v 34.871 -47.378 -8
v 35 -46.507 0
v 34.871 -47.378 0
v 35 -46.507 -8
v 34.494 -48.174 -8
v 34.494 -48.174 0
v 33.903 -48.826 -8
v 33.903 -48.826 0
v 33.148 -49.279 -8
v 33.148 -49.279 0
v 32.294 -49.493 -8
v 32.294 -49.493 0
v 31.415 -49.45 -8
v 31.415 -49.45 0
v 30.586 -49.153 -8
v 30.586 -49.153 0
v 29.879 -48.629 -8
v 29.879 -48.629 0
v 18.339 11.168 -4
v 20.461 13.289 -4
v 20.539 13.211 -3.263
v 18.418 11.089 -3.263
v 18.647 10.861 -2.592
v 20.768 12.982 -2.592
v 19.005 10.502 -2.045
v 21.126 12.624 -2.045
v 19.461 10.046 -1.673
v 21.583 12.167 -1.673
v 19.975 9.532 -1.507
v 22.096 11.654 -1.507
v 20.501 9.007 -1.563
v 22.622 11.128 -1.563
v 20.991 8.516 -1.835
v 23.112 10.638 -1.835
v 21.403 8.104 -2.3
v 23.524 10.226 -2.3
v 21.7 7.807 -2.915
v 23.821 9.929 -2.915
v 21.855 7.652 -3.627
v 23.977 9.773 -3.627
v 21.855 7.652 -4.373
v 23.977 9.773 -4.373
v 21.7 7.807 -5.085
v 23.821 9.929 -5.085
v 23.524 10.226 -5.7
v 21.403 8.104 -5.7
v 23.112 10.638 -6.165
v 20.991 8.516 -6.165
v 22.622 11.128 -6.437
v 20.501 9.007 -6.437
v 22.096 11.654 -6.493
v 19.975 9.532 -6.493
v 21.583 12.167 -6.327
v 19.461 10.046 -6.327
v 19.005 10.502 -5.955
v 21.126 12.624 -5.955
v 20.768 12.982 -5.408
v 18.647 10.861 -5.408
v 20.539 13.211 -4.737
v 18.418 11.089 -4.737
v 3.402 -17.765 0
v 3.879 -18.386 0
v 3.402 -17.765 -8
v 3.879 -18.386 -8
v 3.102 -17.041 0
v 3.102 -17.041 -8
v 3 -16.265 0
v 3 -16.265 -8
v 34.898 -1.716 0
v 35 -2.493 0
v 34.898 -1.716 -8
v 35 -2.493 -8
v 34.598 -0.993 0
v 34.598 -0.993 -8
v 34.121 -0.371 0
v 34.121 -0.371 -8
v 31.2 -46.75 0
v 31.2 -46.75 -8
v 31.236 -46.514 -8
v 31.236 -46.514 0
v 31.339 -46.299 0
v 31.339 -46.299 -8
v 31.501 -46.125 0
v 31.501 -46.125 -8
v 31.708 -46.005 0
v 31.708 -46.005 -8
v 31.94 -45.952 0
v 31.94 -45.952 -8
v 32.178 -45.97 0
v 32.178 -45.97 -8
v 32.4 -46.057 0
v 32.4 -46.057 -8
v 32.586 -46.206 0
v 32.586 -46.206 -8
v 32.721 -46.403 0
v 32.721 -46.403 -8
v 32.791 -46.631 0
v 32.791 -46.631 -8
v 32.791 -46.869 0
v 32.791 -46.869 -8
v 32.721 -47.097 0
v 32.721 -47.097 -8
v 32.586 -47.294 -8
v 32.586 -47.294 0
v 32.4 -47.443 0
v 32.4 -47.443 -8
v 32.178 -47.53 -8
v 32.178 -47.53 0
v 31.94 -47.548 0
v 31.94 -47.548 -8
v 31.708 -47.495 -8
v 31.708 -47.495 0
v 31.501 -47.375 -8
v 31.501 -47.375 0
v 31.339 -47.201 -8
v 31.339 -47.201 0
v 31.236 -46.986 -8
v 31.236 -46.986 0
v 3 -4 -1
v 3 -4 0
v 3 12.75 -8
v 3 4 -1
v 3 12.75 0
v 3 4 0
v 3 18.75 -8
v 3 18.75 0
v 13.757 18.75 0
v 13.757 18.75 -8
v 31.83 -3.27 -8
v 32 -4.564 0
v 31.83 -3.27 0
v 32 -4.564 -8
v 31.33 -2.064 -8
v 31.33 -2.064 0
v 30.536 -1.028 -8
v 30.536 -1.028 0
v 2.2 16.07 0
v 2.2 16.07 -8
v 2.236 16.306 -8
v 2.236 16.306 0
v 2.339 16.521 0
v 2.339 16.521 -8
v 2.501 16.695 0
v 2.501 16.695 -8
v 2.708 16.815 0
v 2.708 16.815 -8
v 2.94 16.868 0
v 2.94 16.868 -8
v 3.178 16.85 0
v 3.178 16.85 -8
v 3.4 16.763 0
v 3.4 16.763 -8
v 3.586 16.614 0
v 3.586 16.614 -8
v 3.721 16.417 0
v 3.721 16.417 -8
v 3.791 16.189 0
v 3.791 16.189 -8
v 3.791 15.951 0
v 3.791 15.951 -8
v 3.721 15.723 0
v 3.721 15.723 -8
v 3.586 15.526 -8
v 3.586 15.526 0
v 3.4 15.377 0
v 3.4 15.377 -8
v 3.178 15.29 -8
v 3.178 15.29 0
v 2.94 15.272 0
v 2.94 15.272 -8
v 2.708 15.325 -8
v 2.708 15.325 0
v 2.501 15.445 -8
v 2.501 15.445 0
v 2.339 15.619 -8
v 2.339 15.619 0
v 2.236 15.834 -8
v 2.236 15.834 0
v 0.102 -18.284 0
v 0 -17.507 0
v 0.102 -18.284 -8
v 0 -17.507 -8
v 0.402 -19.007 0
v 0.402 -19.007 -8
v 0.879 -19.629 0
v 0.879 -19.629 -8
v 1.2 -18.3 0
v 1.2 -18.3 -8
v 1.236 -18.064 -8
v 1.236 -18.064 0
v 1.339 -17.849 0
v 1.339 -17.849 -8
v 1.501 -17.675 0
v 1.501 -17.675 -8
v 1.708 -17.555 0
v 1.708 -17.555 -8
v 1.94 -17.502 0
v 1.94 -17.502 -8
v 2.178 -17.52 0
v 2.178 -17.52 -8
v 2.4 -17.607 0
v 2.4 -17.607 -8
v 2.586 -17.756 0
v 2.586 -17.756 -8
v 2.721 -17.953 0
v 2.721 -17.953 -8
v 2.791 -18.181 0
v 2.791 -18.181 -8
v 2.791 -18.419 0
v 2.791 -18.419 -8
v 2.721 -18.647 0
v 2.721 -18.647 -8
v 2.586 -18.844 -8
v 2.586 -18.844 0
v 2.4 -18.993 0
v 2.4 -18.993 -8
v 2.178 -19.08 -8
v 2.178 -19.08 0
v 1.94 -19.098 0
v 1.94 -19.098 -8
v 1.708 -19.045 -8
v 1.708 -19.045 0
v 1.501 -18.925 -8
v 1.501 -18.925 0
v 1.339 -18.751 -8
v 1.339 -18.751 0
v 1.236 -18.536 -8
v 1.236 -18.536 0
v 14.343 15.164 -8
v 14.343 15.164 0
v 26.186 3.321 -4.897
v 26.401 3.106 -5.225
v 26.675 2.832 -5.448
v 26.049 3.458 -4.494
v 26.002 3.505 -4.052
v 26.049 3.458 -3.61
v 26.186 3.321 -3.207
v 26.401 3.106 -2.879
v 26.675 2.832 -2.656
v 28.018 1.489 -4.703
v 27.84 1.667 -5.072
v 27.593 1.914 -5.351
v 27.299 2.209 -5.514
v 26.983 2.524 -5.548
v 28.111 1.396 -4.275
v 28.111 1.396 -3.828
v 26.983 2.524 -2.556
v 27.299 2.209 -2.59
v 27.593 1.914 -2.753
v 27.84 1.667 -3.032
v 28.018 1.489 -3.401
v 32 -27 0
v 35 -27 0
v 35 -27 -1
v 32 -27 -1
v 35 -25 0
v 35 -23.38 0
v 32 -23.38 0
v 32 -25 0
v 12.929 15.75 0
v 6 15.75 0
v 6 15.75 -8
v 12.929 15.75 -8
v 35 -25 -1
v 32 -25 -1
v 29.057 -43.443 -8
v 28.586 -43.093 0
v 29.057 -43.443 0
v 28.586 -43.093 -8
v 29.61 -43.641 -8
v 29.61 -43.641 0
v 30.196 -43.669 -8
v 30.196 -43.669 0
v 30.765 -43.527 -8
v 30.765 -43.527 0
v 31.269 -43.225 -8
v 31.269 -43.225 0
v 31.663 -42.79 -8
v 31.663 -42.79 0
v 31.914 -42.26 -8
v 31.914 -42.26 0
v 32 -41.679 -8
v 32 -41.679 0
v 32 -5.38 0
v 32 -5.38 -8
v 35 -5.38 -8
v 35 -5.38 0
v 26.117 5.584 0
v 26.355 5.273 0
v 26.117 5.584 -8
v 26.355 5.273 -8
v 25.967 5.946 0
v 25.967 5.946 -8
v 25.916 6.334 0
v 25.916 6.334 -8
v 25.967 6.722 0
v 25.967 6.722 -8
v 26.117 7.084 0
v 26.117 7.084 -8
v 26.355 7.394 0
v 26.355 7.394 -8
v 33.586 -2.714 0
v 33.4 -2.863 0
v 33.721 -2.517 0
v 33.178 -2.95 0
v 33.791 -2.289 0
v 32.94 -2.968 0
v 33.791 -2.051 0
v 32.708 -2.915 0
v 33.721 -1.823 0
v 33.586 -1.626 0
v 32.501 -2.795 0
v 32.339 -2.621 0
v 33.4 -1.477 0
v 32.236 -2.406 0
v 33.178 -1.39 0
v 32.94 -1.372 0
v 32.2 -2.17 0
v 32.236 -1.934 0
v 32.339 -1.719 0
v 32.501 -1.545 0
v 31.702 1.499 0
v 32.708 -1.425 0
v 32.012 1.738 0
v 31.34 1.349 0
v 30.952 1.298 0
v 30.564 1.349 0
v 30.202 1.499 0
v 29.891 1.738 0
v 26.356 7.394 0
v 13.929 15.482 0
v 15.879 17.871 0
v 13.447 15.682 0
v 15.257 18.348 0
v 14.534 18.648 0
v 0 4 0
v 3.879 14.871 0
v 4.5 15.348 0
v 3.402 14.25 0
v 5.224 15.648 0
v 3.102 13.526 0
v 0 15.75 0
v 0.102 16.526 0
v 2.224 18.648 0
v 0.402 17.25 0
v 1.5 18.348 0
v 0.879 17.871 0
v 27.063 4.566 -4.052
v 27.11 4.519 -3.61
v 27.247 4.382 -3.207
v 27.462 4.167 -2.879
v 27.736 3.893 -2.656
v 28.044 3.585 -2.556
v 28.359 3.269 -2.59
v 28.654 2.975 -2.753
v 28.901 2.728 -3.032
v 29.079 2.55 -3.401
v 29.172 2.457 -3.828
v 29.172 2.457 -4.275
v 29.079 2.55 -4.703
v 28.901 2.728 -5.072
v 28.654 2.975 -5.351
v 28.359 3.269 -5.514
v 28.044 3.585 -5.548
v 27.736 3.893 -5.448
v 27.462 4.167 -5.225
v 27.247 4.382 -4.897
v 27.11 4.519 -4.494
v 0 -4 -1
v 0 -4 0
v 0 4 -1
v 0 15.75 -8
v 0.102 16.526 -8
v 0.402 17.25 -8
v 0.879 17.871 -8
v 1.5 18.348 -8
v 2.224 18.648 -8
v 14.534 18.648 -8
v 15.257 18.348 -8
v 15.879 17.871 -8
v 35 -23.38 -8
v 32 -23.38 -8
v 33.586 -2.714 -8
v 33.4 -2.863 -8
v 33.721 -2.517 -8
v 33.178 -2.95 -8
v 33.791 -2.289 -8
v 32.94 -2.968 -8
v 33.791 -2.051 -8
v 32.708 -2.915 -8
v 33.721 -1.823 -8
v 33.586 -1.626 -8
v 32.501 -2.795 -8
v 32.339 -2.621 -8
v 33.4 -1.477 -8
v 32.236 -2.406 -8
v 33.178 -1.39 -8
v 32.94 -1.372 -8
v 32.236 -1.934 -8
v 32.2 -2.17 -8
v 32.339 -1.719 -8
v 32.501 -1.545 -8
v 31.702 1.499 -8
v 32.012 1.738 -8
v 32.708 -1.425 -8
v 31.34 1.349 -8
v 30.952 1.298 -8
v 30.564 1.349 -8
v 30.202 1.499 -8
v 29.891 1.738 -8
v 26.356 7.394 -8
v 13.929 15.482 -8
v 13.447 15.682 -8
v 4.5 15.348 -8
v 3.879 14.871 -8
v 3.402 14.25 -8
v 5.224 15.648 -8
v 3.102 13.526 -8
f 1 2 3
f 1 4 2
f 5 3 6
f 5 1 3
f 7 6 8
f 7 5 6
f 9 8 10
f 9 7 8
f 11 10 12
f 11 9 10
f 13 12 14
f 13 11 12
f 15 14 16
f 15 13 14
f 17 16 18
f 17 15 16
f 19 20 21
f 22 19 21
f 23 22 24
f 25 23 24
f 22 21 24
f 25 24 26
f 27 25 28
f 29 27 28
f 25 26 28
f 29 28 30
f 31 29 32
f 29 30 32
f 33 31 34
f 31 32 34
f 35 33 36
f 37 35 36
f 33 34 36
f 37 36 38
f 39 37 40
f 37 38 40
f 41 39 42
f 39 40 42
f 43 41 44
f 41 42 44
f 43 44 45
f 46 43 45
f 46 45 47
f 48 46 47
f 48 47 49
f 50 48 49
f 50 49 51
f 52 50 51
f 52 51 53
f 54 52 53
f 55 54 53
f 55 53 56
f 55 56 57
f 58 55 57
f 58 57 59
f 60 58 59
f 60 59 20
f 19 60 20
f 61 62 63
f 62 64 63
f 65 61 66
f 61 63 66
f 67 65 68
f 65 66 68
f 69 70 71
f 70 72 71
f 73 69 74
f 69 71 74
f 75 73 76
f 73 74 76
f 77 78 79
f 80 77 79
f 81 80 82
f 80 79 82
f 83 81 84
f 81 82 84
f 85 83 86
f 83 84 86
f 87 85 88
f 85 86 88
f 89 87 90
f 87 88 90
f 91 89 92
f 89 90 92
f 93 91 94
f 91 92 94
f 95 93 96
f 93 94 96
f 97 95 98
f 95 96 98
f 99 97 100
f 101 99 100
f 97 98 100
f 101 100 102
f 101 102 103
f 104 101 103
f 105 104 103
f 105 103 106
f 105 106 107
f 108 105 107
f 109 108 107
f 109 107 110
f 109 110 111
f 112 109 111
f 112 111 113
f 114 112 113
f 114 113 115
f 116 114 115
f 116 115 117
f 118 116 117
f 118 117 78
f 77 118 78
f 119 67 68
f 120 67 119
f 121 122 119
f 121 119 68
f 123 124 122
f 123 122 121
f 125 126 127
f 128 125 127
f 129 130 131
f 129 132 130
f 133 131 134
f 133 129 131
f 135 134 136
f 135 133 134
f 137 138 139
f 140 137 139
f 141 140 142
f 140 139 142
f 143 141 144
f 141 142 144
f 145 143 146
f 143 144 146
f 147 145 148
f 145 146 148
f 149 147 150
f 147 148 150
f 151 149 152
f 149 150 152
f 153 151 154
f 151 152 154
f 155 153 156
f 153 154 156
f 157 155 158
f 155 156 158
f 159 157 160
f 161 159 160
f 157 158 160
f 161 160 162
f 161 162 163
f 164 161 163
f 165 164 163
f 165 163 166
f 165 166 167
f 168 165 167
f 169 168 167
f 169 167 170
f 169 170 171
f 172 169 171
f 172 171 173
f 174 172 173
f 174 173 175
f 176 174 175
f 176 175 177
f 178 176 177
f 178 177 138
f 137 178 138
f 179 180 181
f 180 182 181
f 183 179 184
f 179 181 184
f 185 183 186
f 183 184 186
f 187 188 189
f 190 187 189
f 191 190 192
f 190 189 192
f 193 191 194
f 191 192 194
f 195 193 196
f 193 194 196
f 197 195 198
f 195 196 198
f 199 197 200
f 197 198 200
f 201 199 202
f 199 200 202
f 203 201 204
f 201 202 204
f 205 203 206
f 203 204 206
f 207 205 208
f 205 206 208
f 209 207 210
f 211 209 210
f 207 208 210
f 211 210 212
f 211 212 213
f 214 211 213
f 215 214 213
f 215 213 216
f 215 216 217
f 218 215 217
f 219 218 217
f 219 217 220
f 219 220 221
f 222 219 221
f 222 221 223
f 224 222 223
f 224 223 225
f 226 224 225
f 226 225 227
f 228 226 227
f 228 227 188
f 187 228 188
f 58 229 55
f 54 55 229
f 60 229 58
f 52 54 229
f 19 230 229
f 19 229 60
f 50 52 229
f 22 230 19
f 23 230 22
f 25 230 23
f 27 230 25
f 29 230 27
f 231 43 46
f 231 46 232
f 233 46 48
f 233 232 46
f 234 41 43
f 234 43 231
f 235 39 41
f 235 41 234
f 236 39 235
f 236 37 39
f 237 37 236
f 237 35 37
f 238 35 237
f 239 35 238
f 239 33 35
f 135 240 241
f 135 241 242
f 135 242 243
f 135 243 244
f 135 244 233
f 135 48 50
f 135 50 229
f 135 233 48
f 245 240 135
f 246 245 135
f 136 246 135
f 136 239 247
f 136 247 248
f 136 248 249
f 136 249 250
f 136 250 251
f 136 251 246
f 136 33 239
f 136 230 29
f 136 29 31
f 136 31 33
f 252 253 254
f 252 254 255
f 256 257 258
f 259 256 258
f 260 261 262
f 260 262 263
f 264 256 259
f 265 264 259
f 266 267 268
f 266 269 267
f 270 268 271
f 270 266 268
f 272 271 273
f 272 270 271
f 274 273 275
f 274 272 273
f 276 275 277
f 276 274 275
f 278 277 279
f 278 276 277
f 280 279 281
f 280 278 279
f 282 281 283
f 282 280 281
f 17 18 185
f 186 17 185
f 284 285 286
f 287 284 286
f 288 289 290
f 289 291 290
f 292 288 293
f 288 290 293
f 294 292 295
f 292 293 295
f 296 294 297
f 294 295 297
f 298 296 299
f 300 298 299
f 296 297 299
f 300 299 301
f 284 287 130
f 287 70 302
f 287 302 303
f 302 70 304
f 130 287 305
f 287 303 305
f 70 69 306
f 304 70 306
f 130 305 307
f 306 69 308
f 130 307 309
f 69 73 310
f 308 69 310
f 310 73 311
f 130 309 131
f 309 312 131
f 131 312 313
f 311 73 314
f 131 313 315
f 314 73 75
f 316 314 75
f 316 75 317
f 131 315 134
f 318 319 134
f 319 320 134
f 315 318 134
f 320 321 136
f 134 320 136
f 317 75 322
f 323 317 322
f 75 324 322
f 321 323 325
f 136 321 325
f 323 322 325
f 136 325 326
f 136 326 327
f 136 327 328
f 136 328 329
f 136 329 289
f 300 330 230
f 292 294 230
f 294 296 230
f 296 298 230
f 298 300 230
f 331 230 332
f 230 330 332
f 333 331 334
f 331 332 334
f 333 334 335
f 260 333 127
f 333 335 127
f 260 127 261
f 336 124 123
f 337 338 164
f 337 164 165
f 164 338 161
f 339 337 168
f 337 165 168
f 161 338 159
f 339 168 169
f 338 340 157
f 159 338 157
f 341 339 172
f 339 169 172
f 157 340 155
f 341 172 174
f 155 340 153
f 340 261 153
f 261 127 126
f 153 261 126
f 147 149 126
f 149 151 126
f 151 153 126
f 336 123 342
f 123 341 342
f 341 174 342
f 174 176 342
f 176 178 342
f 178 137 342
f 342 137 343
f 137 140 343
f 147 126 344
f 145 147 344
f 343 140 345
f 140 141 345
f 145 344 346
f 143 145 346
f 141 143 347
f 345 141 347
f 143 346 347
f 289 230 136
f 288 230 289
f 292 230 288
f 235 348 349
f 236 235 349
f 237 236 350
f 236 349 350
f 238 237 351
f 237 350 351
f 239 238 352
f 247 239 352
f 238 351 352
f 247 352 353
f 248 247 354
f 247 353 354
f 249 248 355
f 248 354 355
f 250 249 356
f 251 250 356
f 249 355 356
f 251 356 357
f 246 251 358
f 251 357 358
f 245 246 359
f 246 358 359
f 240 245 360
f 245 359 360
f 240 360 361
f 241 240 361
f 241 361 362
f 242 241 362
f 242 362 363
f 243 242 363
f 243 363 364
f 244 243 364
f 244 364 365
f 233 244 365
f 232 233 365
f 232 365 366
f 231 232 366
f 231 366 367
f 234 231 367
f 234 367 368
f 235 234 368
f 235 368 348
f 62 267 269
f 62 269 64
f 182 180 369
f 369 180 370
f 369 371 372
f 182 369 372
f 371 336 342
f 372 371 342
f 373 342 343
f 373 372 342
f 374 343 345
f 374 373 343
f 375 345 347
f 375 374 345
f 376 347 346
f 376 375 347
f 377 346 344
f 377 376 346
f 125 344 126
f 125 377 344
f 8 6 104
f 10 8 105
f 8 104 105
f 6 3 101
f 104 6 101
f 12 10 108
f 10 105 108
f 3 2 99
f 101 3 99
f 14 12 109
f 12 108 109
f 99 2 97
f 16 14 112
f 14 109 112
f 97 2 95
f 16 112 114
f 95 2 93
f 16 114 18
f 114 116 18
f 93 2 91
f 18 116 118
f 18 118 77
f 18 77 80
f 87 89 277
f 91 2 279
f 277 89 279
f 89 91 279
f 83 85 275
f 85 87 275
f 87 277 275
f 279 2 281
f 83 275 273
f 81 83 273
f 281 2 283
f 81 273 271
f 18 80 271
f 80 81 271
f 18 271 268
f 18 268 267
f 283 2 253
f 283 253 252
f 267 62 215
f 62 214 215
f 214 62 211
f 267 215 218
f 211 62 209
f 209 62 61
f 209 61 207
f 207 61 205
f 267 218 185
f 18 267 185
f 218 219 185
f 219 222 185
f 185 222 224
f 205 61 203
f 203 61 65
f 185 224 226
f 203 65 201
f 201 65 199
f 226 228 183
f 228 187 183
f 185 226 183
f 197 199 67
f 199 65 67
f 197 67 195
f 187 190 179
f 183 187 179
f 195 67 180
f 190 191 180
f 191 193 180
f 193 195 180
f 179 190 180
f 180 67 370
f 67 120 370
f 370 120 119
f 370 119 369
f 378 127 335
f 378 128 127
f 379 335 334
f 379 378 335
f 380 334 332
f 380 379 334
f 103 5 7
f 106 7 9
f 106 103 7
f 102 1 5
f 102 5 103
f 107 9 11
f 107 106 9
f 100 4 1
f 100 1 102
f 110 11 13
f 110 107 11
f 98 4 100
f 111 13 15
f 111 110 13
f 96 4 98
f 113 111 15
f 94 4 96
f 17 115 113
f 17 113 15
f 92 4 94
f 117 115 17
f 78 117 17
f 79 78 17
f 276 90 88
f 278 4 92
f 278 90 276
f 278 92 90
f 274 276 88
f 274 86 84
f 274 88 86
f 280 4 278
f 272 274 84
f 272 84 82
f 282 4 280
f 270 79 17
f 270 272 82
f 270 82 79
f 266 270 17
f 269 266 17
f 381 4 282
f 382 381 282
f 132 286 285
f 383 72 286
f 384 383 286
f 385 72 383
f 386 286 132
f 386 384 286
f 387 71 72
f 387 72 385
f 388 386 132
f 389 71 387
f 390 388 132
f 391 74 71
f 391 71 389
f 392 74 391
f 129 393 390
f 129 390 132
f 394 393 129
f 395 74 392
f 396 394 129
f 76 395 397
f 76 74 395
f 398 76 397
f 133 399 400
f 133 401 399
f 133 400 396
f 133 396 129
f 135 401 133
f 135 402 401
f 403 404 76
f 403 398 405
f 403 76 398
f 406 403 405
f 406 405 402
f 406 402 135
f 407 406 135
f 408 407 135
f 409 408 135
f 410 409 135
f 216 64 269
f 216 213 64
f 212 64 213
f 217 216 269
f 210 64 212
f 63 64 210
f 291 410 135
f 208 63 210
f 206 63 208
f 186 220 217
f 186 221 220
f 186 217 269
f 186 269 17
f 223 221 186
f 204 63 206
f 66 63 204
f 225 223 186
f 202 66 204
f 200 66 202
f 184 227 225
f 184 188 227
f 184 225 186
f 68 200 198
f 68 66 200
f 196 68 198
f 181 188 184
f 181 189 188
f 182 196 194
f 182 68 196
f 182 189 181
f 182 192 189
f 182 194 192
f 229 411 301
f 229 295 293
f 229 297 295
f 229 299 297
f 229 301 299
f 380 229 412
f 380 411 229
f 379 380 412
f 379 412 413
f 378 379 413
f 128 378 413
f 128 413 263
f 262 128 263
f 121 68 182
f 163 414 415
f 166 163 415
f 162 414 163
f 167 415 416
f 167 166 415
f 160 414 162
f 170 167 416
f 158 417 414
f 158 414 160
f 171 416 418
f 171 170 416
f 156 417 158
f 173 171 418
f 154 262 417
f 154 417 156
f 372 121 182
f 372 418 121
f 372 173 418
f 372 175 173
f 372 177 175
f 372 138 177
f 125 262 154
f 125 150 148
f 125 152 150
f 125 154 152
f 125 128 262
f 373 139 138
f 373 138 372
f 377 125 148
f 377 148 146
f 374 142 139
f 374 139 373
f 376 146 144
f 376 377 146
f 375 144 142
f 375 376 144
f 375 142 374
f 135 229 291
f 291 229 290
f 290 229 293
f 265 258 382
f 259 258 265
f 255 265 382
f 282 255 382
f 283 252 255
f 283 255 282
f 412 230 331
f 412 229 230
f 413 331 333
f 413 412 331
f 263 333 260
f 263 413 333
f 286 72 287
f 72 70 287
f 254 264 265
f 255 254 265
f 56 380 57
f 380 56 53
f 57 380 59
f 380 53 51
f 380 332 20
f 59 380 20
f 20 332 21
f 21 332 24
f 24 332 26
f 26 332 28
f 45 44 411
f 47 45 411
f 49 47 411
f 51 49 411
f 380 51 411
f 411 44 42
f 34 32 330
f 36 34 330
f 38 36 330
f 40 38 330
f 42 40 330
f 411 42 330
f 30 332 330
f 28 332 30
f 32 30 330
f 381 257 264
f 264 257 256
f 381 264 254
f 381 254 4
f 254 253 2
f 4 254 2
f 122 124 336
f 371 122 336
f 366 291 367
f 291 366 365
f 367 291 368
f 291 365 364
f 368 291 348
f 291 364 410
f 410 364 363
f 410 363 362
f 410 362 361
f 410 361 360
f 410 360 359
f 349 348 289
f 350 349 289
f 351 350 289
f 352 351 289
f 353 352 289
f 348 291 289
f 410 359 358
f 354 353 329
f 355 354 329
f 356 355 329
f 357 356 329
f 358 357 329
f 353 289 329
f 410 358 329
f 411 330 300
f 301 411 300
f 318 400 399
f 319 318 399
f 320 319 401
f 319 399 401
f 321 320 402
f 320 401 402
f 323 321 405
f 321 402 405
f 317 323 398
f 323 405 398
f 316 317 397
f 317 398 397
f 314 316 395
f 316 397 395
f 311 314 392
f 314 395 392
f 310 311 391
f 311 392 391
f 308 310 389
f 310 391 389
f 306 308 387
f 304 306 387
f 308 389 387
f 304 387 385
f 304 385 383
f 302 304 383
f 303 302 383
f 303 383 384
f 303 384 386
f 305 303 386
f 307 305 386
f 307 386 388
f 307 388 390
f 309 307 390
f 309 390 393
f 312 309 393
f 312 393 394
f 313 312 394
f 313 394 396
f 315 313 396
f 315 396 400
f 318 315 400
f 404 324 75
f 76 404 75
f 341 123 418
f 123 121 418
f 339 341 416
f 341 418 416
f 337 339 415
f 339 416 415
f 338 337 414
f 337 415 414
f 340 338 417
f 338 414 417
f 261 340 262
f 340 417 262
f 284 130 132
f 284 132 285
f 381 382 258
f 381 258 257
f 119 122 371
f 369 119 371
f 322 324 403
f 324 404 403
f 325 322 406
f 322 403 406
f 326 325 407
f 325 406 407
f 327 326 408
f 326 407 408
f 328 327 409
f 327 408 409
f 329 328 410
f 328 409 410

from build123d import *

# Parameters (mm, degrees)
EXTRUDE_1079_DEPTH     = 8
FILLET_4_R             = 3
FILLET_5_R             = 2
SKETCH_13_W            = 3
SKETCH_13_H            = 8
SKETCH_13_H_2          = 2
CUT_EXTRUDE_2700_DEPTH = 1
HOLE_WIZARD_M2_D       = 1.6
FILLET_6_R             = 3
FILLET_7_R             = 5
SKETCH_19_W            = 4
SKETCH_19_H            = 18
CUT_EXTRUDE_4512_DEPTH = 62.155364655
CUT_EXTRUDE_1_REACH    = 71.276
SKETCH_20_R            = 2.5
SKETCH_20_R_2          = 1.5
CUT_EXTRUDE_2_DEPTH    = 62.155364655
FILLET_8_R             = 1.5


with BuildPart() as part:
    # Эскиз8 → Extrude 1079 (new body)
    with BuildSketch(Plane.XY):
        Polygon((0, -18.75), (0, 18.75), (15, 18.75), (35, -1.25), (35, -53.75), align=None)
        Polygon((32, -46.507359313), (3, -17.507359313), (3, 15.75), (13.757359313, 15.75), (32, -2.492640687), align=None, mode=Mode.SUBTRACT)
    extrude(amount=-EXTRUDE_1079_DEPTH)

    # Скругление4
    fillet_4_edges = [part.edges().sort_by_distance(p)[0] for p in [
        (3, -17.507359313, -4),
        (3, 15.75, -4),
        (15, 18.75, -4),
        (35, -1.25, -4),
        (0, -18.75, -4),
        (0, 18.75, -4),
    ]]
    fillet(fillet_4_edges, radius=FILLET_4_R)

    # Скругление5
    fillet_5_edges = [part.edges().sort_by_distance(p)[0] for p in [
        (13.757359313, 15.75, -4),
        (32, -46.507359313, -4),
    ]]
    fillet(fillet_5_edges, radius=FILLET_5_R)

    # Эскиз13 → Cut-Extrude 2700 (cut)
    with BuildSketch(Plane(origin=(0, 0, 0), x_dir=(-1, 0, 0), z_dir=(0, 0, -1))):
        with Locations((-1.5, 0)):
            Rectangle(SKETCH_13_W, SKETCH_13_H)
        with Locations((-33.5, -26)):
            Rectangle(SKETCH_13_W, SKETCH_13_H_2)
    extrude(amount=CUT_EXTRUDE_2700_DEPTH, mode=Mode.SUBTRACT)

    # Крепление рамки M2 (through all)
    with Locations(Plane.XY):
        with Locations((2, -18.3), (3, 16.07), (32, -46.75), (33, -2.17)):
            Hole(HOLE_WIZARD_M2_D / 2)

    # Скругление6
    fillet_6_edges = [part.edges().sort_by_distance(p)[0] for p in [
        (35, -53.75, -4),
    ]]
    fillet(fillet_6_edges, radius=FILLET_6_R)

    # Скругление7
    fillet_7_edges = [part.edges().sort_by_distance(p)[0] for p in [
        (32, -2.492640687, -4),
    ]]
    fillet(fillet_7_edges, radius=FILLET_7_R)

    # Эскиз19 → Cut-Extrude 4512 (cut, through all)
    with BuildSketch(Plane.XY):
        with Locations((33, -14.38)):
            Rectangle(SKETCH_19_W, SKETCH_19_H)
    extrude(amount=-CUT_EXTRUDE_4512_DEPTH, mode=Mode.SUBTRACT)

    # Эскиз20 → Вырез-Вытянуть1 (cut, up to next)
    with BuildSketch(Plane(origin=(16.875, 16.875, 0), x_dir=(0, 0, -1), z_dir=(0.7071067811865488, 0.7071067811865462, 0)), mode=Mode.PRIVATE) as cut_extrude_1_sk1:
        with Locations(Location((4, -7.570990258, 0), (0, 0, 90))):
            Circle(SKETCH_20_R)
    cut_extrude_1_tool1 = extrude(cut_extrude_1_sk1.sketch, amount=-CUT_EXTRUDE_1_REACH, mode=Mode.PRIVATE) & part.part
    # Эскиз20 → Вырез-Вытянуть1 (cut, up to next)
    with BuildSketch(Plane(origin=(16.875, 16.875, 0), x_dir=(0, 0, -1), z_dir=(0.7071067811865488, 0.7071067811865462, 0)), mode=Mode.PRIVATE) as cut_extrude_1_sk2:
        with Locations(Location((4.0519, -17.407536383, 0), (0, 0, 90))):
            Circle(SKETCH_20_R_2)
    cut_extrude_1_tool2 = extrude(cut_extrude_1_sk2.sketch, amount=-CUT_EXTRUDE_1_REACH, mode=Mode.PRIVATE) & part.part
    add(cut_extrude_1_tool1.solids().sort_by_distance((22.228499, 11.521501, -4))[0], mode=Mode.SUBTRACT)
    add(cut_extrude_1_tool2.solids().sort_by_distance((29.183987, 4.566013, -4.0519))[0], mode=Mode.SUBTRACT)

    # Эскиз21 → Вырез-Вытянуть2 (cut, through all)
    with BuildSketch(Plane.XY):
        Polygon((26.355559895, 7.394440105), (25.294899724, 6.333779933), (30.951753973, 0.676925683), (32.012414145, 1.737585855), align=None)
    extrude(amount=-CUT_EXTRUDE_2_DEPTH, mode=Mode.SUBTRACT)

    # Скругление8
    fillet_8_edges = [part.edges().sort_by_distance(p)[0] for p in [
        (30.951753973, 0.676925683, -4),
        (25.294899724, 6.333779933, -4),
    ]]
    fillet(fillet_8_edges, radius=FILLET_8_R - 0.0001)  # a hair under: the kernel refuses the full size


solid = part.part
